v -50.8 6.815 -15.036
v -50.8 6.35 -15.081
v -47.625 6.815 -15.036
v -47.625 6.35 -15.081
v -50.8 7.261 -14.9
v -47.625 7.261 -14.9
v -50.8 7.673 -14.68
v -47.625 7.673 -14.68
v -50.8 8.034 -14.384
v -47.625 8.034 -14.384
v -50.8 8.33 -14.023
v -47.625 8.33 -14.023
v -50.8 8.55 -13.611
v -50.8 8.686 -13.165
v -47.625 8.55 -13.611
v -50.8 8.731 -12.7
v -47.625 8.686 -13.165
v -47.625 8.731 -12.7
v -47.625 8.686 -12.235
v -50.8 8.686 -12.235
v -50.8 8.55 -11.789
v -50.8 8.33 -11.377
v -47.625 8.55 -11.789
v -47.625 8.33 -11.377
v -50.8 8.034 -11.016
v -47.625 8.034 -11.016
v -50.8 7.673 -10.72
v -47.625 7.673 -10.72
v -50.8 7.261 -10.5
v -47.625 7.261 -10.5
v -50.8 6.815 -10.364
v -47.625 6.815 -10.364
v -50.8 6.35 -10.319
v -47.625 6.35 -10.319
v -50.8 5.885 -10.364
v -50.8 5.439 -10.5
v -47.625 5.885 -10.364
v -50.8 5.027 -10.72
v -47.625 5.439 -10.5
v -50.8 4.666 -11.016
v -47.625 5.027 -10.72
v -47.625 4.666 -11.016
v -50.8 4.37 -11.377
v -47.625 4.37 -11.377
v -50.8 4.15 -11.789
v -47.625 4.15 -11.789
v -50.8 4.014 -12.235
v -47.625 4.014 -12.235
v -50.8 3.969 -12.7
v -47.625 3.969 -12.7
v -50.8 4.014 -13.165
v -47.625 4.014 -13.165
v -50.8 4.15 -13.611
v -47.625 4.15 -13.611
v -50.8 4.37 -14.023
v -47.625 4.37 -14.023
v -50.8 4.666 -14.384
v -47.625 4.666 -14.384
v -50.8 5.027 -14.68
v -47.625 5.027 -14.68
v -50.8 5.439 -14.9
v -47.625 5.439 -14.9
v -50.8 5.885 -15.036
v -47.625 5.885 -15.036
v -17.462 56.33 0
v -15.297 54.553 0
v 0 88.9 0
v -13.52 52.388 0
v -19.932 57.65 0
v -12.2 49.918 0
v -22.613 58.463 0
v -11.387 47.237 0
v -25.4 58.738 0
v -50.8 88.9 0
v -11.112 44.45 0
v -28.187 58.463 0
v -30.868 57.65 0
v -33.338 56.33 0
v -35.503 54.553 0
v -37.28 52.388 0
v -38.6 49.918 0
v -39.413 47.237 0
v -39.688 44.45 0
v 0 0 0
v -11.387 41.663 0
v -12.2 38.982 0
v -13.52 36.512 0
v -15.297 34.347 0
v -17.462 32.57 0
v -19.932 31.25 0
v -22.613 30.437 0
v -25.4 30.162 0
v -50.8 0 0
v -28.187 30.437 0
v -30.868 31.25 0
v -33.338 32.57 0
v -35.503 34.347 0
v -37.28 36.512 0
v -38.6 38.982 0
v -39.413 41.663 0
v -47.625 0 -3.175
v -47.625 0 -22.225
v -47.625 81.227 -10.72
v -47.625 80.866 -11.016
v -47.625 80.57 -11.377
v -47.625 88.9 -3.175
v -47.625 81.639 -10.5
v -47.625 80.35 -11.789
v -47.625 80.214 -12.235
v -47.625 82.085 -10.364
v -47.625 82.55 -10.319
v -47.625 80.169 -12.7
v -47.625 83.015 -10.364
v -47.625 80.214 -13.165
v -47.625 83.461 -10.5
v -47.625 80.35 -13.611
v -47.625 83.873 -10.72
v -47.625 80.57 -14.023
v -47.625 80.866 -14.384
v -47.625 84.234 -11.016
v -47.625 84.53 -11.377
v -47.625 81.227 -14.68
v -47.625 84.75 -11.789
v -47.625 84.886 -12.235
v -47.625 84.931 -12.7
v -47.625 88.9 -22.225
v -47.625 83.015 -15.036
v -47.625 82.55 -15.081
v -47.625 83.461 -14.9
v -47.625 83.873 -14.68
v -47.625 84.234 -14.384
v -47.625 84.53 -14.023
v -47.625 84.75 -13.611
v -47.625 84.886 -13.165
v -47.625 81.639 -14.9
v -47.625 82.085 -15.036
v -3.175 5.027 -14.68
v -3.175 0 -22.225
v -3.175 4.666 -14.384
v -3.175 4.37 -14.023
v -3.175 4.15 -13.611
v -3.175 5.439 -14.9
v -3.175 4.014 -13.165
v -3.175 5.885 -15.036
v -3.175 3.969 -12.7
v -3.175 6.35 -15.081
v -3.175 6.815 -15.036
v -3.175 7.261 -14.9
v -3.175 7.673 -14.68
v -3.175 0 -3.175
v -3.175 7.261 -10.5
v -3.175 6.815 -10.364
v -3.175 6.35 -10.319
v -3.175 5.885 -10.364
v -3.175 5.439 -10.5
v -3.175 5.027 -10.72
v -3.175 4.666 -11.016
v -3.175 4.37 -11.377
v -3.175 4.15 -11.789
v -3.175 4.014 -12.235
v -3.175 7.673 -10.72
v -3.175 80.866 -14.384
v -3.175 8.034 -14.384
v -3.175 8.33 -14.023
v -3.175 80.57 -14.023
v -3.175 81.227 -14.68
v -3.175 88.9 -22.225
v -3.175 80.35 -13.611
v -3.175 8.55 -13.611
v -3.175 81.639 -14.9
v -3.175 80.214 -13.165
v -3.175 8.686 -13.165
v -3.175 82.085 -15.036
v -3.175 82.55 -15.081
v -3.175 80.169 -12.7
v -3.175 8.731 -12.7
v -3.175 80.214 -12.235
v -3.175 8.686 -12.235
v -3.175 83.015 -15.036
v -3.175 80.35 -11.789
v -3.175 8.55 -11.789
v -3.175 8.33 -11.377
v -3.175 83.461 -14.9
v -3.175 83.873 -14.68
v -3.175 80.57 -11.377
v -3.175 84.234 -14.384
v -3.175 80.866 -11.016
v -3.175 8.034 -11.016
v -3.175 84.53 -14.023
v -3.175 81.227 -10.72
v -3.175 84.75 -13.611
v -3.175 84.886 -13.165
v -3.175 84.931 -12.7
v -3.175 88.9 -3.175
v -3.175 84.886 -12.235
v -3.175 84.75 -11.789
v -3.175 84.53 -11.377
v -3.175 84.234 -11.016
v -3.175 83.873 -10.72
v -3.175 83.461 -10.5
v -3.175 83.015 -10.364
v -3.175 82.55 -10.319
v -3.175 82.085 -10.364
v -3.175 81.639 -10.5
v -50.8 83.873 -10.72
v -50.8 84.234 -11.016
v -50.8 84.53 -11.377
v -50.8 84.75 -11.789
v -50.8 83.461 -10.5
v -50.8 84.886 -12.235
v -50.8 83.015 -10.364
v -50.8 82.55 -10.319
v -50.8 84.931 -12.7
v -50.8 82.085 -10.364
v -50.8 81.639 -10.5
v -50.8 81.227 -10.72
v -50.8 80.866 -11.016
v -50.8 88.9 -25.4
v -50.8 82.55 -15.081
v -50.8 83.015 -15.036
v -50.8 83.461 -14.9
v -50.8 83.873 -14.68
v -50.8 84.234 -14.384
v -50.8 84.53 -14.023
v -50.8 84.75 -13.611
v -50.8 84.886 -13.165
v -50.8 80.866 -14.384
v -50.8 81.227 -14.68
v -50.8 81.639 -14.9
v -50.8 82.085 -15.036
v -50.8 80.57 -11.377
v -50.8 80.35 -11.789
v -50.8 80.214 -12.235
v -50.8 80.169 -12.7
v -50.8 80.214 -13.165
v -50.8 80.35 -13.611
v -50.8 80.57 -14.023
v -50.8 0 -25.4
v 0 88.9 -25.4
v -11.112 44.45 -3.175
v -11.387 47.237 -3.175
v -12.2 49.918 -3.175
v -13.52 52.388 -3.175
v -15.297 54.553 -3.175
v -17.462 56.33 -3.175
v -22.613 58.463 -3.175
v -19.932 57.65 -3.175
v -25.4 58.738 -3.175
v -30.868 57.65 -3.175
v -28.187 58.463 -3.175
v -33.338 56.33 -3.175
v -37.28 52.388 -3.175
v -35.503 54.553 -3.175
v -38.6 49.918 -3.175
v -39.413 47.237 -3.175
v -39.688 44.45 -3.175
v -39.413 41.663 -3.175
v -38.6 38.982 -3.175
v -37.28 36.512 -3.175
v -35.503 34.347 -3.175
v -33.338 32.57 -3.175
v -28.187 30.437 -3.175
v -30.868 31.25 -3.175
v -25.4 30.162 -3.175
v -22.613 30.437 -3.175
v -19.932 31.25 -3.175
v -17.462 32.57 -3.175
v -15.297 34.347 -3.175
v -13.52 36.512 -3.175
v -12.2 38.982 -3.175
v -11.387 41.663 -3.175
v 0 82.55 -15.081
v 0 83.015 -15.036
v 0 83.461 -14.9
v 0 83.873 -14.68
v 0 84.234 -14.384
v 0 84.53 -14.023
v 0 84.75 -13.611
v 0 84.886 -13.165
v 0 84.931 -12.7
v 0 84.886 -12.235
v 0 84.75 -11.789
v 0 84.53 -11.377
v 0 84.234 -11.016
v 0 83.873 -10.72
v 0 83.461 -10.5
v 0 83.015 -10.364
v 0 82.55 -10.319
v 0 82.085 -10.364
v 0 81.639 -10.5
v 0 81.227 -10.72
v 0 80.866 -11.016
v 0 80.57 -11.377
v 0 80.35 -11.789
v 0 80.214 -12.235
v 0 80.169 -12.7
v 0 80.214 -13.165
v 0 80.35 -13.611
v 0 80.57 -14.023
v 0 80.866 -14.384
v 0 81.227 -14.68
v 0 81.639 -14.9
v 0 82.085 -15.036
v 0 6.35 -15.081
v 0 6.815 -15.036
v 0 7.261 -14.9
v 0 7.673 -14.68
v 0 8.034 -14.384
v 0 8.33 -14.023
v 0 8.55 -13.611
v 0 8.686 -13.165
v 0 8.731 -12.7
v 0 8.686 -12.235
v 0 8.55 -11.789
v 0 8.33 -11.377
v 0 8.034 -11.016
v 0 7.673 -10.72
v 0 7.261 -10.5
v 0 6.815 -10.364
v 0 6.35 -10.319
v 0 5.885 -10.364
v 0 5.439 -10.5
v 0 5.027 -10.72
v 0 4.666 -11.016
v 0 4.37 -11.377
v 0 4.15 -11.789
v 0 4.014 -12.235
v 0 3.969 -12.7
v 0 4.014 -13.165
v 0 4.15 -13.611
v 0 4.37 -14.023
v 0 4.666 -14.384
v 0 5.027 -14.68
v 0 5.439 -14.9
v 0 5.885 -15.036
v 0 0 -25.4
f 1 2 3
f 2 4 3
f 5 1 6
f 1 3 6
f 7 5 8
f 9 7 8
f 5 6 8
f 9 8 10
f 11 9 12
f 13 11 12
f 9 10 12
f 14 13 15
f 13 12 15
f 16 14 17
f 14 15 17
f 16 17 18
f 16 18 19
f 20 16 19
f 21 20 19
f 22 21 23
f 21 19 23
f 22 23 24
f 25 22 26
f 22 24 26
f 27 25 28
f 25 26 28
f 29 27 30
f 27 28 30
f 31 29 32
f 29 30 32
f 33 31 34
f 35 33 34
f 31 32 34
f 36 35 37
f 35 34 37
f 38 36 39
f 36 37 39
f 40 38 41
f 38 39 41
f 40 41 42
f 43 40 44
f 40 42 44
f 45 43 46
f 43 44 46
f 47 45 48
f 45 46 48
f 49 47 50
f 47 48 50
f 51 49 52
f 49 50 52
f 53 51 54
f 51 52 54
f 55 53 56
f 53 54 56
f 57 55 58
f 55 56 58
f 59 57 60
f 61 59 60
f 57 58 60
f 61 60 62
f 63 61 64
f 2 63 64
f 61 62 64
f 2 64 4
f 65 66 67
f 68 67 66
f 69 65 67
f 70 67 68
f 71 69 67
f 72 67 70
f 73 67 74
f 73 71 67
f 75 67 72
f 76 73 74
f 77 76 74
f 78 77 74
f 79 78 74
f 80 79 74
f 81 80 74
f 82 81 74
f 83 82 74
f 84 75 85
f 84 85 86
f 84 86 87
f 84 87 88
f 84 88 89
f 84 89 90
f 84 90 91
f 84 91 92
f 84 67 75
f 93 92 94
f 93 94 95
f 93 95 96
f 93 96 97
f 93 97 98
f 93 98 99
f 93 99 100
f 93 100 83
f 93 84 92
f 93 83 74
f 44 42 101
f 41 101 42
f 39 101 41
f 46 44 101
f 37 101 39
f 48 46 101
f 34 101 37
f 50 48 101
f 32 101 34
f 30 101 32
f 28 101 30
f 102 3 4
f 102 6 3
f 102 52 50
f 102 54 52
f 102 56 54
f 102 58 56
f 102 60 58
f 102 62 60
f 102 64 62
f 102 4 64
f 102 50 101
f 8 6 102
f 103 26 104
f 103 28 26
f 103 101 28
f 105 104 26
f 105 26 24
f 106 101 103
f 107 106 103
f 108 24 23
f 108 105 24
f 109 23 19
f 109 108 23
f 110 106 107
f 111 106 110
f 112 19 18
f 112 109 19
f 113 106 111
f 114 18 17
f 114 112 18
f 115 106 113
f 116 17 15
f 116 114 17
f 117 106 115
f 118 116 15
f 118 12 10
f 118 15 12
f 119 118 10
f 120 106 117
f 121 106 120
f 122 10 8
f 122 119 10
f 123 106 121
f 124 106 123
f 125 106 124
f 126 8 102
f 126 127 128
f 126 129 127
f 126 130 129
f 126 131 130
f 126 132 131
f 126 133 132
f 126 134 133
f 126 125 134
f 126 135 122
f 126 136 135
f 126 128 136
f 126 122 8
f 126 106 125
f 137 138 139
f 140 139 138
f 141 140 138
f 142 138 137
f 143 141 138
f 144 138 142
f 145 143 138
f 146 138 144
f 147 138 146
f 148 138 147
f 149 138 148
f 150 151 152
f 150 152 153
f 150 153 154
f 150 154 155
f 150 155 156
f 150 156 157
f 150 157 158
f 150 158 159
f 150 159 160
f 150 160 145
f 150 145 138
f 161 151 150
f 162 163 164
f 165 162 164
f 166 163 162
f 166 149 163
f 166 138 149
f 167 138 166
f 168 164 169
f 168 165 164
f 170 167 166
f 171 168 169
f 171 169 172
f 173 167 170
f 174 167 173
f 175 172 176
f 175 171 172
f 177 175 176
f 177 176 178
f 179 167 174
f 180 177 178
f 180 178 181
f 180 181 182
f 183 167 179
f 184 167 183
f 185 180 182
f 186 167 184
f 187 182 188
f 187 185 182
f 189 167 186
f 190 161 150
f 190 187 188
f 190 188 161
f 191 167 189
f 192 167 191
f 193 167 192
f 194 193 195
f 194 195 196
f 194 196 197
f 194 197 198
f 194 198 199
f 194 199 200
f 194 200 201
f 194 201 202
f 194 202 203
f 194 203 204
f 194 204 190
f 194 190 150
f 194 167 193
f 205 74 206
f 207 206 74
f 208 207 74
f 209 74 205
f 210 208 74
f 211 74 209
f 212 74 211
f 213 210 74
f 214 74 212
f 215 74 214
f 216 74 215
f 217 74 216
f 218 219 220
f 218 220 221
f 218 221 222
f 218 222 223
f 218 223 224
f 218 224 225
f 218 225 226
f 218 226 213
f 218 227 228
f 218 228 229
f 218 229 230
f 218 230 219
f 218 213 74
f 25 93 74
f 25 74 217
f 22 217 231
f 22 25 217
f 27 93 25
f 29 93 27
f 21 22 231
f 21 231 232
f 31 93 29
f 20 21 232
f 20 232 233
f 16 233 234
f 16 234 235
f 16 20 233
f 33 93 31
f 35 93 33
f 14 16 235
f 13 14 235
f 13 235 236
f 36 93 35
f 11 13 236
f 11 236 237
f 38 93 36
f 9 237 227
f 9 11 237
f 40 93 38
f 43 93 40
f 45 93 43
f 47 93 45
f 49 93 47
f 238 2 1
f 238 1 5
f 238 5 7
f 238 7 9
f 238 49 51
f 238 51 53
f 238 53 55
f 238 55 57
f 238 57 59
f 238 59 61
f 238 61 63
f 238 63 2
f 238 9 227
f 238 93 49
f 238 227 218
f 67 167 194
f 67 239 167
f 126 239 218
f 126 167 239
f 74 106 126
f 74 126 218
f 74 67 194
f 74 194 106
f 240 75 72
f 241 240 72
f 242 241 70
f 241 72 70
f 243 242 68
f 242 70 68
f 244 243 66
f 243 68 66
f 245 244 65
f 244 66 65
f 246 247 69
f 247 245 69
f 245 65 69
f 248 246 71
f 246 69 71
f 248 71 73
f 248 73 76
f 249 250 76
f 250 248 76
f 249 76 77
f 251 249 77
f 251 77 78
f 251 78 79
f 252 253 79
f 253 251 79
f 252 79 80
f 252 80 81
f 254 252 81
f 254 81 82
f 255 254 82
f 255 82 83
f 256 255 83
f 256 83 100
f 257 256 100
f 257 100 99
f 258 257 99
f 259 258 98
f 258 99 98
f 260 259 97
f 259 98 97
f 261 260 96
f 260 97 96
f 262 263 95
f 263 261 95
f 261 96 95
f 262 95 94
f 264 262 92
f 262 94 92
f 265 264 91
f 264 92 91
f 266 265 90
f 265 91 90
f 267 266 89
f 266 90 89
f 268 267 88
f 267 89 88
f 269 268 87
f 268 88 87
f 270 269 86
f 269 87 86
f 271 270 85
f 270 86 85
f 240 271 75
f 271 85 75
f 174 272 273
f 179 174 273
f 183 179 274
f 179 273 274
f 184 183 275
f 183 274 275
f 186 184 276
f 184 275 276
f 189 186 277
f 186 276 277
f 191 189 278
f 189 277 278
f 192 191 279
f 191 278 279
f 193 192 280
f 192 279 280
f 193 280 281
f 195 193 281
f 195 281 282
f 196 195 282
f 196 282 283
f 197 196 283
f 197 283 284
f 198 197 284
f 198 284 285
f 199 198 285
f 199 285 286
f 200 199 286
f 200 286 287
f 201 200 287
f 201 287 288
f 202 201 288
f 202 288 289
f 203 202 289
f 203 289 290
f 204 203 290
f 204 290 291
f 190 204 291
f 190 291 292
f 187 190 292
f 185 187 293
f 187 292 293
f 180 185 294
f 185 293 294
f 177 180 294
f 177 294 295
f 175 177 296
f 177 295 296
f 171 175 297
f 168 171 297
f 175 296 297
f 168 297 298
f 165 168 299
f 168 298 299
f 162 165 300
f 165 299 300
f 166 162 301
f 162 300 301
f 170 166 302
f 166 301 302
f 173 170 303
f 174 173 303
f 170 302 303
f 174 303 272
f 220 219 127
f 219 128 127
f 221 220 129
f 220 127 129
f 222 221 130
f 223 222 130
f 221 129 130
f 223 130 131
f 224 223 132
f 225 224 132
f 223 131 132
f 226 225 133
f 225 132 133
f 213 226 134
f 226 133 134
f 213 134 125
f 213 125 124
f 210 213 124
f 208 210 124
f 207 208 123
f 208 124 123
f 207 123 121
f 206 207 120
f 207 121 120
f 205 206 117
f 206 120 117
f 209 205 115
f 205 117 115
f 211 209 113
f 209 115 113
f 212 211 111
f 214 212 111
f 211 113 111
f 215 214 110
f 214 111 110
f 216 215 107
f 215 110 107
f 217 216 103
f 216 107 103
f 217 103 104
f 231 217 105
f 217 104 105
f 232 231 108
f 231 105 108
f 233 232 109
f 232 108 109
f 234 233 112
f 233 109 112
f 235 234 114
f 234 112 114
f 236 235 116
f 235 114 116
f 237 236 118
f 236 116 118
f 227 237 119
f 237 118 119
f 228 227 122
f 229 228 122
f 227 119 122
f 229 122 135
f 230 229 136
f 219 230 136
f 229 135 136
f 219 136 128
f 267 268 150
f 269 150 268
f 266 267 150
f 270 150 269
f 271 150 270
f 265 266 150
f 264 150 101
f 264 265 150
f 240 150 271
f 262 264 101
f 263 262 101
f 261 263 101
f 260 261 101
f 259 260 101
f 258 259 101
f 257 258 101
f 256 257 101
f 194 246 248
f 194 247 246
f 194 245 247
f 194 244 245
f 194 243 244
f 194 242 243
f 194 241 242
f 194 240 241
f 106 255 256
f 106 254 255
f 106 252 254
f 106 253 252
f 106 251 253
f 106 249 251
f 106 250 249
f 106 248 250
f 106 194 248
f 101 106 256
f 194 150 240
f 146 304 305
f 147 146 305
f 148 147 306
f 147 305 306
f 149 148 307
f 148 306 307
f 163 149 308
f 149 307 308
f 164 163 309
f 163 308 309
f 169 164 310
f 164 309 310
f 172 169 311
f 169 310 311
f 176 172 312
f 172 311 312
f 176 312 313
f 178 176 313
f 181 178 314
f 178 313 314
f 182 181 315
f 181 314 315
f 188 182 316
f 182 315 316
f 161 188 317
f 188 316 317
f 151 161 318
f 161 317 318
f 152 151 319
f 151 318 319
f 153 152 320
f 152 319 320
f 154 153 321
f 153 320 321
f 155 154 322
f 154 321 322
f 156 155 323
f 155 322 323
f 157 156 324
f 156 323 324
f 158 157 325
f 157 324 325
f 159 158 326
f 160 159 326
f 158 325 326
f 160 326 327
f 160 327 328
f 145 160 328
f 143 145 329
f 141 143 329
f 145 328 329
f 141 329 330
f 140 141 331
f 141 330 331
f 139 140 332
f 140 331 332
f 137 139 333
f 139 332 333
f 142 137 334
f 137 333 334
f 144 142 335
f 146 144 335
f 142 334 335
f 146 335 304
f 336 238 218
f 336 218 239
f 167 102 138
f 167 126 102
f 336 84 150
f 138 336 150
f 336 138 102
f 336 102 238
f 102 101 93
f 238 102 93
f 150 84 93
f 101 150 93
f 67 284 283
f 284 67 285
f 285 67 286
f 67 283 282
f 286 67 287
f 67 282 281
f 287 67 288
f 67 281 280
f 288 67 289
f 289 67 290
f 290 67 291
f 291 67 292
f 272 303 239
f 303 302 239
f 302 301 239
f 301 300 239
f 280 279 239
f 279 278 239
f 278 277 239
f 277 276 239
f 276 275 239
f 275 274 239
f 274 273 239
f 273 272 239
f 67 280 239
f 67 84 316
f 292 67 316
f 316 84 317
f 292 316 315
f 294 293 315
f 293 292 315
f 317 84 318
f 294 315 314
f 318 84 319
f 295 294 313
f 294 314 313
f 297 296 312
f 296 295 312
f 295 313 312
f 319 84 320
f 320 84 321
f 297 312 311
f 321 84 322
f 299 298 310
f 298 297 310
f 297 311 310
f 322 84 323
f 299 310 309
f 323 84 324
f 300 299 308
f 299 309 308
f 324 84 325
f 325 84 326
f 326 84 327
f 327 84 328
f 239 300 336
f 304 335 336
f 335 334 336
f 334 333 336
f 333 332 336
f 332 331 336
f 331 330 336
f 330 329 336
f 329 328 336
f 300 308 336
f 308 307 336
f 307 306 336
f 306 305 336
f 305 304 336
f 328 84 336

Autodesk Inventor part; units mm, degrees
ref_plane "YZ Plane" through (0, 0, 0) normal (1, 0, 0) x (0, 1, 0)
ref_plane "XZ Plane" through (0, 0, 0) normal (0, 1, 0) x (-1, 0, 0)
ref_plane "XY Plane" through (0, 0, 0) normal (0, 0, 1) x (1, 0, 0)
sketch "Sketch3" plane through (0, 0, 0) normal (0, 1, 0) x (-1, 0, 0)
  line L0 (0, 0) -> (50.8, 0)
  line L1 (50.8, 0) -> (50.8, -25.4)
  line L2 (50.8, -25.4) -> (0, -25.4)
  line L3 (0, 0) -> (0, -25.4)
  dimension "d9" = 50.8
  dimension "d10" = 25.4
  dimension "d11" = 50.8
extrude "Extrusion3" add sketch "Sketch3" along normal blind 88.9
sketch "Sketch4" plane through (0, 88.9, 0) normal (0, 1, 0) x (1, 0, 0)
  line L0 (0, 25.4) -> (-50.8, 25.4) projected
  line L1 (-50.8, 25.4) -> (-50.8, 0) projected
  line L2 (-50.8, 0) -> (0, 0) projected
  line L3 (0, 0) -> (0, 25.4) projected
  line L4 (-47.625, 22.225) -> (-3.175, 22.225)
  line L5 (-3.175, 22.225) -> (-3.175, 3.175)
  line L6 (-3.175, 3.175) -> (-47.625, 3.175)
  line L7 (-47.625, 3.175) -> (-47.625, 22.225)
  dimension "d14" = 3.175
extrude "Extrusion4" cut sketch "Sketch4" against normal blind 88.9 contours L4 L5 L6 L7
sketch "Sketch5" plane through (-50.8, 0, 0) normal (0, 0, 1) x (1, 0, 0)
  line L0 (0, 0) -> (0, 88.9) projected
  line L1 (0, 0) -> (25.4, 0)
  line L2 (0, 0) -> (50.8, 0) projected
  line L3 (25.4, 0) -> (25.4, 44.45)
  circle A0 centre (25.4, 44.45) radius 14.2875
  dimension "d17" = 25.4
  dimension "d18" = 44.45
  dimension "d19" = 28.575
extrude "Extrusion5" cut sketch "Sketch5" against normal blind 3.175
sketch "Sketch6" plane through (0, 0, 0) normal (1, 0, 0) x (0, 0, -1)
  line L0 (0, 0) -> (25.4, 0) projected
  line L1 (0, 0) -> (12.7, 0)
  line L2 (12.7, 0) -> (12.7, 6.35)
  circle A0 centre (12.7, 6.35) radius 2.3813
  line L3 (25.4, 0) -> (25.4, 88.9) projected
  line L4 (12.7, 6.35) -> (12.7, 82.55)
  circle A1 centre (12.7, 82.55) radius 2.3813
  dimension "d22" = 12.7
  dimension "d23" = 6.35
  dimension "d24" = 4.7625
  dimension "d26" = 76.2
  dimension "d27" = 4.7625
extrude "Extrusion6" cut sketch "Sketch6" against normal up to surface (50.8 mm away)
properties part number "Bar"
